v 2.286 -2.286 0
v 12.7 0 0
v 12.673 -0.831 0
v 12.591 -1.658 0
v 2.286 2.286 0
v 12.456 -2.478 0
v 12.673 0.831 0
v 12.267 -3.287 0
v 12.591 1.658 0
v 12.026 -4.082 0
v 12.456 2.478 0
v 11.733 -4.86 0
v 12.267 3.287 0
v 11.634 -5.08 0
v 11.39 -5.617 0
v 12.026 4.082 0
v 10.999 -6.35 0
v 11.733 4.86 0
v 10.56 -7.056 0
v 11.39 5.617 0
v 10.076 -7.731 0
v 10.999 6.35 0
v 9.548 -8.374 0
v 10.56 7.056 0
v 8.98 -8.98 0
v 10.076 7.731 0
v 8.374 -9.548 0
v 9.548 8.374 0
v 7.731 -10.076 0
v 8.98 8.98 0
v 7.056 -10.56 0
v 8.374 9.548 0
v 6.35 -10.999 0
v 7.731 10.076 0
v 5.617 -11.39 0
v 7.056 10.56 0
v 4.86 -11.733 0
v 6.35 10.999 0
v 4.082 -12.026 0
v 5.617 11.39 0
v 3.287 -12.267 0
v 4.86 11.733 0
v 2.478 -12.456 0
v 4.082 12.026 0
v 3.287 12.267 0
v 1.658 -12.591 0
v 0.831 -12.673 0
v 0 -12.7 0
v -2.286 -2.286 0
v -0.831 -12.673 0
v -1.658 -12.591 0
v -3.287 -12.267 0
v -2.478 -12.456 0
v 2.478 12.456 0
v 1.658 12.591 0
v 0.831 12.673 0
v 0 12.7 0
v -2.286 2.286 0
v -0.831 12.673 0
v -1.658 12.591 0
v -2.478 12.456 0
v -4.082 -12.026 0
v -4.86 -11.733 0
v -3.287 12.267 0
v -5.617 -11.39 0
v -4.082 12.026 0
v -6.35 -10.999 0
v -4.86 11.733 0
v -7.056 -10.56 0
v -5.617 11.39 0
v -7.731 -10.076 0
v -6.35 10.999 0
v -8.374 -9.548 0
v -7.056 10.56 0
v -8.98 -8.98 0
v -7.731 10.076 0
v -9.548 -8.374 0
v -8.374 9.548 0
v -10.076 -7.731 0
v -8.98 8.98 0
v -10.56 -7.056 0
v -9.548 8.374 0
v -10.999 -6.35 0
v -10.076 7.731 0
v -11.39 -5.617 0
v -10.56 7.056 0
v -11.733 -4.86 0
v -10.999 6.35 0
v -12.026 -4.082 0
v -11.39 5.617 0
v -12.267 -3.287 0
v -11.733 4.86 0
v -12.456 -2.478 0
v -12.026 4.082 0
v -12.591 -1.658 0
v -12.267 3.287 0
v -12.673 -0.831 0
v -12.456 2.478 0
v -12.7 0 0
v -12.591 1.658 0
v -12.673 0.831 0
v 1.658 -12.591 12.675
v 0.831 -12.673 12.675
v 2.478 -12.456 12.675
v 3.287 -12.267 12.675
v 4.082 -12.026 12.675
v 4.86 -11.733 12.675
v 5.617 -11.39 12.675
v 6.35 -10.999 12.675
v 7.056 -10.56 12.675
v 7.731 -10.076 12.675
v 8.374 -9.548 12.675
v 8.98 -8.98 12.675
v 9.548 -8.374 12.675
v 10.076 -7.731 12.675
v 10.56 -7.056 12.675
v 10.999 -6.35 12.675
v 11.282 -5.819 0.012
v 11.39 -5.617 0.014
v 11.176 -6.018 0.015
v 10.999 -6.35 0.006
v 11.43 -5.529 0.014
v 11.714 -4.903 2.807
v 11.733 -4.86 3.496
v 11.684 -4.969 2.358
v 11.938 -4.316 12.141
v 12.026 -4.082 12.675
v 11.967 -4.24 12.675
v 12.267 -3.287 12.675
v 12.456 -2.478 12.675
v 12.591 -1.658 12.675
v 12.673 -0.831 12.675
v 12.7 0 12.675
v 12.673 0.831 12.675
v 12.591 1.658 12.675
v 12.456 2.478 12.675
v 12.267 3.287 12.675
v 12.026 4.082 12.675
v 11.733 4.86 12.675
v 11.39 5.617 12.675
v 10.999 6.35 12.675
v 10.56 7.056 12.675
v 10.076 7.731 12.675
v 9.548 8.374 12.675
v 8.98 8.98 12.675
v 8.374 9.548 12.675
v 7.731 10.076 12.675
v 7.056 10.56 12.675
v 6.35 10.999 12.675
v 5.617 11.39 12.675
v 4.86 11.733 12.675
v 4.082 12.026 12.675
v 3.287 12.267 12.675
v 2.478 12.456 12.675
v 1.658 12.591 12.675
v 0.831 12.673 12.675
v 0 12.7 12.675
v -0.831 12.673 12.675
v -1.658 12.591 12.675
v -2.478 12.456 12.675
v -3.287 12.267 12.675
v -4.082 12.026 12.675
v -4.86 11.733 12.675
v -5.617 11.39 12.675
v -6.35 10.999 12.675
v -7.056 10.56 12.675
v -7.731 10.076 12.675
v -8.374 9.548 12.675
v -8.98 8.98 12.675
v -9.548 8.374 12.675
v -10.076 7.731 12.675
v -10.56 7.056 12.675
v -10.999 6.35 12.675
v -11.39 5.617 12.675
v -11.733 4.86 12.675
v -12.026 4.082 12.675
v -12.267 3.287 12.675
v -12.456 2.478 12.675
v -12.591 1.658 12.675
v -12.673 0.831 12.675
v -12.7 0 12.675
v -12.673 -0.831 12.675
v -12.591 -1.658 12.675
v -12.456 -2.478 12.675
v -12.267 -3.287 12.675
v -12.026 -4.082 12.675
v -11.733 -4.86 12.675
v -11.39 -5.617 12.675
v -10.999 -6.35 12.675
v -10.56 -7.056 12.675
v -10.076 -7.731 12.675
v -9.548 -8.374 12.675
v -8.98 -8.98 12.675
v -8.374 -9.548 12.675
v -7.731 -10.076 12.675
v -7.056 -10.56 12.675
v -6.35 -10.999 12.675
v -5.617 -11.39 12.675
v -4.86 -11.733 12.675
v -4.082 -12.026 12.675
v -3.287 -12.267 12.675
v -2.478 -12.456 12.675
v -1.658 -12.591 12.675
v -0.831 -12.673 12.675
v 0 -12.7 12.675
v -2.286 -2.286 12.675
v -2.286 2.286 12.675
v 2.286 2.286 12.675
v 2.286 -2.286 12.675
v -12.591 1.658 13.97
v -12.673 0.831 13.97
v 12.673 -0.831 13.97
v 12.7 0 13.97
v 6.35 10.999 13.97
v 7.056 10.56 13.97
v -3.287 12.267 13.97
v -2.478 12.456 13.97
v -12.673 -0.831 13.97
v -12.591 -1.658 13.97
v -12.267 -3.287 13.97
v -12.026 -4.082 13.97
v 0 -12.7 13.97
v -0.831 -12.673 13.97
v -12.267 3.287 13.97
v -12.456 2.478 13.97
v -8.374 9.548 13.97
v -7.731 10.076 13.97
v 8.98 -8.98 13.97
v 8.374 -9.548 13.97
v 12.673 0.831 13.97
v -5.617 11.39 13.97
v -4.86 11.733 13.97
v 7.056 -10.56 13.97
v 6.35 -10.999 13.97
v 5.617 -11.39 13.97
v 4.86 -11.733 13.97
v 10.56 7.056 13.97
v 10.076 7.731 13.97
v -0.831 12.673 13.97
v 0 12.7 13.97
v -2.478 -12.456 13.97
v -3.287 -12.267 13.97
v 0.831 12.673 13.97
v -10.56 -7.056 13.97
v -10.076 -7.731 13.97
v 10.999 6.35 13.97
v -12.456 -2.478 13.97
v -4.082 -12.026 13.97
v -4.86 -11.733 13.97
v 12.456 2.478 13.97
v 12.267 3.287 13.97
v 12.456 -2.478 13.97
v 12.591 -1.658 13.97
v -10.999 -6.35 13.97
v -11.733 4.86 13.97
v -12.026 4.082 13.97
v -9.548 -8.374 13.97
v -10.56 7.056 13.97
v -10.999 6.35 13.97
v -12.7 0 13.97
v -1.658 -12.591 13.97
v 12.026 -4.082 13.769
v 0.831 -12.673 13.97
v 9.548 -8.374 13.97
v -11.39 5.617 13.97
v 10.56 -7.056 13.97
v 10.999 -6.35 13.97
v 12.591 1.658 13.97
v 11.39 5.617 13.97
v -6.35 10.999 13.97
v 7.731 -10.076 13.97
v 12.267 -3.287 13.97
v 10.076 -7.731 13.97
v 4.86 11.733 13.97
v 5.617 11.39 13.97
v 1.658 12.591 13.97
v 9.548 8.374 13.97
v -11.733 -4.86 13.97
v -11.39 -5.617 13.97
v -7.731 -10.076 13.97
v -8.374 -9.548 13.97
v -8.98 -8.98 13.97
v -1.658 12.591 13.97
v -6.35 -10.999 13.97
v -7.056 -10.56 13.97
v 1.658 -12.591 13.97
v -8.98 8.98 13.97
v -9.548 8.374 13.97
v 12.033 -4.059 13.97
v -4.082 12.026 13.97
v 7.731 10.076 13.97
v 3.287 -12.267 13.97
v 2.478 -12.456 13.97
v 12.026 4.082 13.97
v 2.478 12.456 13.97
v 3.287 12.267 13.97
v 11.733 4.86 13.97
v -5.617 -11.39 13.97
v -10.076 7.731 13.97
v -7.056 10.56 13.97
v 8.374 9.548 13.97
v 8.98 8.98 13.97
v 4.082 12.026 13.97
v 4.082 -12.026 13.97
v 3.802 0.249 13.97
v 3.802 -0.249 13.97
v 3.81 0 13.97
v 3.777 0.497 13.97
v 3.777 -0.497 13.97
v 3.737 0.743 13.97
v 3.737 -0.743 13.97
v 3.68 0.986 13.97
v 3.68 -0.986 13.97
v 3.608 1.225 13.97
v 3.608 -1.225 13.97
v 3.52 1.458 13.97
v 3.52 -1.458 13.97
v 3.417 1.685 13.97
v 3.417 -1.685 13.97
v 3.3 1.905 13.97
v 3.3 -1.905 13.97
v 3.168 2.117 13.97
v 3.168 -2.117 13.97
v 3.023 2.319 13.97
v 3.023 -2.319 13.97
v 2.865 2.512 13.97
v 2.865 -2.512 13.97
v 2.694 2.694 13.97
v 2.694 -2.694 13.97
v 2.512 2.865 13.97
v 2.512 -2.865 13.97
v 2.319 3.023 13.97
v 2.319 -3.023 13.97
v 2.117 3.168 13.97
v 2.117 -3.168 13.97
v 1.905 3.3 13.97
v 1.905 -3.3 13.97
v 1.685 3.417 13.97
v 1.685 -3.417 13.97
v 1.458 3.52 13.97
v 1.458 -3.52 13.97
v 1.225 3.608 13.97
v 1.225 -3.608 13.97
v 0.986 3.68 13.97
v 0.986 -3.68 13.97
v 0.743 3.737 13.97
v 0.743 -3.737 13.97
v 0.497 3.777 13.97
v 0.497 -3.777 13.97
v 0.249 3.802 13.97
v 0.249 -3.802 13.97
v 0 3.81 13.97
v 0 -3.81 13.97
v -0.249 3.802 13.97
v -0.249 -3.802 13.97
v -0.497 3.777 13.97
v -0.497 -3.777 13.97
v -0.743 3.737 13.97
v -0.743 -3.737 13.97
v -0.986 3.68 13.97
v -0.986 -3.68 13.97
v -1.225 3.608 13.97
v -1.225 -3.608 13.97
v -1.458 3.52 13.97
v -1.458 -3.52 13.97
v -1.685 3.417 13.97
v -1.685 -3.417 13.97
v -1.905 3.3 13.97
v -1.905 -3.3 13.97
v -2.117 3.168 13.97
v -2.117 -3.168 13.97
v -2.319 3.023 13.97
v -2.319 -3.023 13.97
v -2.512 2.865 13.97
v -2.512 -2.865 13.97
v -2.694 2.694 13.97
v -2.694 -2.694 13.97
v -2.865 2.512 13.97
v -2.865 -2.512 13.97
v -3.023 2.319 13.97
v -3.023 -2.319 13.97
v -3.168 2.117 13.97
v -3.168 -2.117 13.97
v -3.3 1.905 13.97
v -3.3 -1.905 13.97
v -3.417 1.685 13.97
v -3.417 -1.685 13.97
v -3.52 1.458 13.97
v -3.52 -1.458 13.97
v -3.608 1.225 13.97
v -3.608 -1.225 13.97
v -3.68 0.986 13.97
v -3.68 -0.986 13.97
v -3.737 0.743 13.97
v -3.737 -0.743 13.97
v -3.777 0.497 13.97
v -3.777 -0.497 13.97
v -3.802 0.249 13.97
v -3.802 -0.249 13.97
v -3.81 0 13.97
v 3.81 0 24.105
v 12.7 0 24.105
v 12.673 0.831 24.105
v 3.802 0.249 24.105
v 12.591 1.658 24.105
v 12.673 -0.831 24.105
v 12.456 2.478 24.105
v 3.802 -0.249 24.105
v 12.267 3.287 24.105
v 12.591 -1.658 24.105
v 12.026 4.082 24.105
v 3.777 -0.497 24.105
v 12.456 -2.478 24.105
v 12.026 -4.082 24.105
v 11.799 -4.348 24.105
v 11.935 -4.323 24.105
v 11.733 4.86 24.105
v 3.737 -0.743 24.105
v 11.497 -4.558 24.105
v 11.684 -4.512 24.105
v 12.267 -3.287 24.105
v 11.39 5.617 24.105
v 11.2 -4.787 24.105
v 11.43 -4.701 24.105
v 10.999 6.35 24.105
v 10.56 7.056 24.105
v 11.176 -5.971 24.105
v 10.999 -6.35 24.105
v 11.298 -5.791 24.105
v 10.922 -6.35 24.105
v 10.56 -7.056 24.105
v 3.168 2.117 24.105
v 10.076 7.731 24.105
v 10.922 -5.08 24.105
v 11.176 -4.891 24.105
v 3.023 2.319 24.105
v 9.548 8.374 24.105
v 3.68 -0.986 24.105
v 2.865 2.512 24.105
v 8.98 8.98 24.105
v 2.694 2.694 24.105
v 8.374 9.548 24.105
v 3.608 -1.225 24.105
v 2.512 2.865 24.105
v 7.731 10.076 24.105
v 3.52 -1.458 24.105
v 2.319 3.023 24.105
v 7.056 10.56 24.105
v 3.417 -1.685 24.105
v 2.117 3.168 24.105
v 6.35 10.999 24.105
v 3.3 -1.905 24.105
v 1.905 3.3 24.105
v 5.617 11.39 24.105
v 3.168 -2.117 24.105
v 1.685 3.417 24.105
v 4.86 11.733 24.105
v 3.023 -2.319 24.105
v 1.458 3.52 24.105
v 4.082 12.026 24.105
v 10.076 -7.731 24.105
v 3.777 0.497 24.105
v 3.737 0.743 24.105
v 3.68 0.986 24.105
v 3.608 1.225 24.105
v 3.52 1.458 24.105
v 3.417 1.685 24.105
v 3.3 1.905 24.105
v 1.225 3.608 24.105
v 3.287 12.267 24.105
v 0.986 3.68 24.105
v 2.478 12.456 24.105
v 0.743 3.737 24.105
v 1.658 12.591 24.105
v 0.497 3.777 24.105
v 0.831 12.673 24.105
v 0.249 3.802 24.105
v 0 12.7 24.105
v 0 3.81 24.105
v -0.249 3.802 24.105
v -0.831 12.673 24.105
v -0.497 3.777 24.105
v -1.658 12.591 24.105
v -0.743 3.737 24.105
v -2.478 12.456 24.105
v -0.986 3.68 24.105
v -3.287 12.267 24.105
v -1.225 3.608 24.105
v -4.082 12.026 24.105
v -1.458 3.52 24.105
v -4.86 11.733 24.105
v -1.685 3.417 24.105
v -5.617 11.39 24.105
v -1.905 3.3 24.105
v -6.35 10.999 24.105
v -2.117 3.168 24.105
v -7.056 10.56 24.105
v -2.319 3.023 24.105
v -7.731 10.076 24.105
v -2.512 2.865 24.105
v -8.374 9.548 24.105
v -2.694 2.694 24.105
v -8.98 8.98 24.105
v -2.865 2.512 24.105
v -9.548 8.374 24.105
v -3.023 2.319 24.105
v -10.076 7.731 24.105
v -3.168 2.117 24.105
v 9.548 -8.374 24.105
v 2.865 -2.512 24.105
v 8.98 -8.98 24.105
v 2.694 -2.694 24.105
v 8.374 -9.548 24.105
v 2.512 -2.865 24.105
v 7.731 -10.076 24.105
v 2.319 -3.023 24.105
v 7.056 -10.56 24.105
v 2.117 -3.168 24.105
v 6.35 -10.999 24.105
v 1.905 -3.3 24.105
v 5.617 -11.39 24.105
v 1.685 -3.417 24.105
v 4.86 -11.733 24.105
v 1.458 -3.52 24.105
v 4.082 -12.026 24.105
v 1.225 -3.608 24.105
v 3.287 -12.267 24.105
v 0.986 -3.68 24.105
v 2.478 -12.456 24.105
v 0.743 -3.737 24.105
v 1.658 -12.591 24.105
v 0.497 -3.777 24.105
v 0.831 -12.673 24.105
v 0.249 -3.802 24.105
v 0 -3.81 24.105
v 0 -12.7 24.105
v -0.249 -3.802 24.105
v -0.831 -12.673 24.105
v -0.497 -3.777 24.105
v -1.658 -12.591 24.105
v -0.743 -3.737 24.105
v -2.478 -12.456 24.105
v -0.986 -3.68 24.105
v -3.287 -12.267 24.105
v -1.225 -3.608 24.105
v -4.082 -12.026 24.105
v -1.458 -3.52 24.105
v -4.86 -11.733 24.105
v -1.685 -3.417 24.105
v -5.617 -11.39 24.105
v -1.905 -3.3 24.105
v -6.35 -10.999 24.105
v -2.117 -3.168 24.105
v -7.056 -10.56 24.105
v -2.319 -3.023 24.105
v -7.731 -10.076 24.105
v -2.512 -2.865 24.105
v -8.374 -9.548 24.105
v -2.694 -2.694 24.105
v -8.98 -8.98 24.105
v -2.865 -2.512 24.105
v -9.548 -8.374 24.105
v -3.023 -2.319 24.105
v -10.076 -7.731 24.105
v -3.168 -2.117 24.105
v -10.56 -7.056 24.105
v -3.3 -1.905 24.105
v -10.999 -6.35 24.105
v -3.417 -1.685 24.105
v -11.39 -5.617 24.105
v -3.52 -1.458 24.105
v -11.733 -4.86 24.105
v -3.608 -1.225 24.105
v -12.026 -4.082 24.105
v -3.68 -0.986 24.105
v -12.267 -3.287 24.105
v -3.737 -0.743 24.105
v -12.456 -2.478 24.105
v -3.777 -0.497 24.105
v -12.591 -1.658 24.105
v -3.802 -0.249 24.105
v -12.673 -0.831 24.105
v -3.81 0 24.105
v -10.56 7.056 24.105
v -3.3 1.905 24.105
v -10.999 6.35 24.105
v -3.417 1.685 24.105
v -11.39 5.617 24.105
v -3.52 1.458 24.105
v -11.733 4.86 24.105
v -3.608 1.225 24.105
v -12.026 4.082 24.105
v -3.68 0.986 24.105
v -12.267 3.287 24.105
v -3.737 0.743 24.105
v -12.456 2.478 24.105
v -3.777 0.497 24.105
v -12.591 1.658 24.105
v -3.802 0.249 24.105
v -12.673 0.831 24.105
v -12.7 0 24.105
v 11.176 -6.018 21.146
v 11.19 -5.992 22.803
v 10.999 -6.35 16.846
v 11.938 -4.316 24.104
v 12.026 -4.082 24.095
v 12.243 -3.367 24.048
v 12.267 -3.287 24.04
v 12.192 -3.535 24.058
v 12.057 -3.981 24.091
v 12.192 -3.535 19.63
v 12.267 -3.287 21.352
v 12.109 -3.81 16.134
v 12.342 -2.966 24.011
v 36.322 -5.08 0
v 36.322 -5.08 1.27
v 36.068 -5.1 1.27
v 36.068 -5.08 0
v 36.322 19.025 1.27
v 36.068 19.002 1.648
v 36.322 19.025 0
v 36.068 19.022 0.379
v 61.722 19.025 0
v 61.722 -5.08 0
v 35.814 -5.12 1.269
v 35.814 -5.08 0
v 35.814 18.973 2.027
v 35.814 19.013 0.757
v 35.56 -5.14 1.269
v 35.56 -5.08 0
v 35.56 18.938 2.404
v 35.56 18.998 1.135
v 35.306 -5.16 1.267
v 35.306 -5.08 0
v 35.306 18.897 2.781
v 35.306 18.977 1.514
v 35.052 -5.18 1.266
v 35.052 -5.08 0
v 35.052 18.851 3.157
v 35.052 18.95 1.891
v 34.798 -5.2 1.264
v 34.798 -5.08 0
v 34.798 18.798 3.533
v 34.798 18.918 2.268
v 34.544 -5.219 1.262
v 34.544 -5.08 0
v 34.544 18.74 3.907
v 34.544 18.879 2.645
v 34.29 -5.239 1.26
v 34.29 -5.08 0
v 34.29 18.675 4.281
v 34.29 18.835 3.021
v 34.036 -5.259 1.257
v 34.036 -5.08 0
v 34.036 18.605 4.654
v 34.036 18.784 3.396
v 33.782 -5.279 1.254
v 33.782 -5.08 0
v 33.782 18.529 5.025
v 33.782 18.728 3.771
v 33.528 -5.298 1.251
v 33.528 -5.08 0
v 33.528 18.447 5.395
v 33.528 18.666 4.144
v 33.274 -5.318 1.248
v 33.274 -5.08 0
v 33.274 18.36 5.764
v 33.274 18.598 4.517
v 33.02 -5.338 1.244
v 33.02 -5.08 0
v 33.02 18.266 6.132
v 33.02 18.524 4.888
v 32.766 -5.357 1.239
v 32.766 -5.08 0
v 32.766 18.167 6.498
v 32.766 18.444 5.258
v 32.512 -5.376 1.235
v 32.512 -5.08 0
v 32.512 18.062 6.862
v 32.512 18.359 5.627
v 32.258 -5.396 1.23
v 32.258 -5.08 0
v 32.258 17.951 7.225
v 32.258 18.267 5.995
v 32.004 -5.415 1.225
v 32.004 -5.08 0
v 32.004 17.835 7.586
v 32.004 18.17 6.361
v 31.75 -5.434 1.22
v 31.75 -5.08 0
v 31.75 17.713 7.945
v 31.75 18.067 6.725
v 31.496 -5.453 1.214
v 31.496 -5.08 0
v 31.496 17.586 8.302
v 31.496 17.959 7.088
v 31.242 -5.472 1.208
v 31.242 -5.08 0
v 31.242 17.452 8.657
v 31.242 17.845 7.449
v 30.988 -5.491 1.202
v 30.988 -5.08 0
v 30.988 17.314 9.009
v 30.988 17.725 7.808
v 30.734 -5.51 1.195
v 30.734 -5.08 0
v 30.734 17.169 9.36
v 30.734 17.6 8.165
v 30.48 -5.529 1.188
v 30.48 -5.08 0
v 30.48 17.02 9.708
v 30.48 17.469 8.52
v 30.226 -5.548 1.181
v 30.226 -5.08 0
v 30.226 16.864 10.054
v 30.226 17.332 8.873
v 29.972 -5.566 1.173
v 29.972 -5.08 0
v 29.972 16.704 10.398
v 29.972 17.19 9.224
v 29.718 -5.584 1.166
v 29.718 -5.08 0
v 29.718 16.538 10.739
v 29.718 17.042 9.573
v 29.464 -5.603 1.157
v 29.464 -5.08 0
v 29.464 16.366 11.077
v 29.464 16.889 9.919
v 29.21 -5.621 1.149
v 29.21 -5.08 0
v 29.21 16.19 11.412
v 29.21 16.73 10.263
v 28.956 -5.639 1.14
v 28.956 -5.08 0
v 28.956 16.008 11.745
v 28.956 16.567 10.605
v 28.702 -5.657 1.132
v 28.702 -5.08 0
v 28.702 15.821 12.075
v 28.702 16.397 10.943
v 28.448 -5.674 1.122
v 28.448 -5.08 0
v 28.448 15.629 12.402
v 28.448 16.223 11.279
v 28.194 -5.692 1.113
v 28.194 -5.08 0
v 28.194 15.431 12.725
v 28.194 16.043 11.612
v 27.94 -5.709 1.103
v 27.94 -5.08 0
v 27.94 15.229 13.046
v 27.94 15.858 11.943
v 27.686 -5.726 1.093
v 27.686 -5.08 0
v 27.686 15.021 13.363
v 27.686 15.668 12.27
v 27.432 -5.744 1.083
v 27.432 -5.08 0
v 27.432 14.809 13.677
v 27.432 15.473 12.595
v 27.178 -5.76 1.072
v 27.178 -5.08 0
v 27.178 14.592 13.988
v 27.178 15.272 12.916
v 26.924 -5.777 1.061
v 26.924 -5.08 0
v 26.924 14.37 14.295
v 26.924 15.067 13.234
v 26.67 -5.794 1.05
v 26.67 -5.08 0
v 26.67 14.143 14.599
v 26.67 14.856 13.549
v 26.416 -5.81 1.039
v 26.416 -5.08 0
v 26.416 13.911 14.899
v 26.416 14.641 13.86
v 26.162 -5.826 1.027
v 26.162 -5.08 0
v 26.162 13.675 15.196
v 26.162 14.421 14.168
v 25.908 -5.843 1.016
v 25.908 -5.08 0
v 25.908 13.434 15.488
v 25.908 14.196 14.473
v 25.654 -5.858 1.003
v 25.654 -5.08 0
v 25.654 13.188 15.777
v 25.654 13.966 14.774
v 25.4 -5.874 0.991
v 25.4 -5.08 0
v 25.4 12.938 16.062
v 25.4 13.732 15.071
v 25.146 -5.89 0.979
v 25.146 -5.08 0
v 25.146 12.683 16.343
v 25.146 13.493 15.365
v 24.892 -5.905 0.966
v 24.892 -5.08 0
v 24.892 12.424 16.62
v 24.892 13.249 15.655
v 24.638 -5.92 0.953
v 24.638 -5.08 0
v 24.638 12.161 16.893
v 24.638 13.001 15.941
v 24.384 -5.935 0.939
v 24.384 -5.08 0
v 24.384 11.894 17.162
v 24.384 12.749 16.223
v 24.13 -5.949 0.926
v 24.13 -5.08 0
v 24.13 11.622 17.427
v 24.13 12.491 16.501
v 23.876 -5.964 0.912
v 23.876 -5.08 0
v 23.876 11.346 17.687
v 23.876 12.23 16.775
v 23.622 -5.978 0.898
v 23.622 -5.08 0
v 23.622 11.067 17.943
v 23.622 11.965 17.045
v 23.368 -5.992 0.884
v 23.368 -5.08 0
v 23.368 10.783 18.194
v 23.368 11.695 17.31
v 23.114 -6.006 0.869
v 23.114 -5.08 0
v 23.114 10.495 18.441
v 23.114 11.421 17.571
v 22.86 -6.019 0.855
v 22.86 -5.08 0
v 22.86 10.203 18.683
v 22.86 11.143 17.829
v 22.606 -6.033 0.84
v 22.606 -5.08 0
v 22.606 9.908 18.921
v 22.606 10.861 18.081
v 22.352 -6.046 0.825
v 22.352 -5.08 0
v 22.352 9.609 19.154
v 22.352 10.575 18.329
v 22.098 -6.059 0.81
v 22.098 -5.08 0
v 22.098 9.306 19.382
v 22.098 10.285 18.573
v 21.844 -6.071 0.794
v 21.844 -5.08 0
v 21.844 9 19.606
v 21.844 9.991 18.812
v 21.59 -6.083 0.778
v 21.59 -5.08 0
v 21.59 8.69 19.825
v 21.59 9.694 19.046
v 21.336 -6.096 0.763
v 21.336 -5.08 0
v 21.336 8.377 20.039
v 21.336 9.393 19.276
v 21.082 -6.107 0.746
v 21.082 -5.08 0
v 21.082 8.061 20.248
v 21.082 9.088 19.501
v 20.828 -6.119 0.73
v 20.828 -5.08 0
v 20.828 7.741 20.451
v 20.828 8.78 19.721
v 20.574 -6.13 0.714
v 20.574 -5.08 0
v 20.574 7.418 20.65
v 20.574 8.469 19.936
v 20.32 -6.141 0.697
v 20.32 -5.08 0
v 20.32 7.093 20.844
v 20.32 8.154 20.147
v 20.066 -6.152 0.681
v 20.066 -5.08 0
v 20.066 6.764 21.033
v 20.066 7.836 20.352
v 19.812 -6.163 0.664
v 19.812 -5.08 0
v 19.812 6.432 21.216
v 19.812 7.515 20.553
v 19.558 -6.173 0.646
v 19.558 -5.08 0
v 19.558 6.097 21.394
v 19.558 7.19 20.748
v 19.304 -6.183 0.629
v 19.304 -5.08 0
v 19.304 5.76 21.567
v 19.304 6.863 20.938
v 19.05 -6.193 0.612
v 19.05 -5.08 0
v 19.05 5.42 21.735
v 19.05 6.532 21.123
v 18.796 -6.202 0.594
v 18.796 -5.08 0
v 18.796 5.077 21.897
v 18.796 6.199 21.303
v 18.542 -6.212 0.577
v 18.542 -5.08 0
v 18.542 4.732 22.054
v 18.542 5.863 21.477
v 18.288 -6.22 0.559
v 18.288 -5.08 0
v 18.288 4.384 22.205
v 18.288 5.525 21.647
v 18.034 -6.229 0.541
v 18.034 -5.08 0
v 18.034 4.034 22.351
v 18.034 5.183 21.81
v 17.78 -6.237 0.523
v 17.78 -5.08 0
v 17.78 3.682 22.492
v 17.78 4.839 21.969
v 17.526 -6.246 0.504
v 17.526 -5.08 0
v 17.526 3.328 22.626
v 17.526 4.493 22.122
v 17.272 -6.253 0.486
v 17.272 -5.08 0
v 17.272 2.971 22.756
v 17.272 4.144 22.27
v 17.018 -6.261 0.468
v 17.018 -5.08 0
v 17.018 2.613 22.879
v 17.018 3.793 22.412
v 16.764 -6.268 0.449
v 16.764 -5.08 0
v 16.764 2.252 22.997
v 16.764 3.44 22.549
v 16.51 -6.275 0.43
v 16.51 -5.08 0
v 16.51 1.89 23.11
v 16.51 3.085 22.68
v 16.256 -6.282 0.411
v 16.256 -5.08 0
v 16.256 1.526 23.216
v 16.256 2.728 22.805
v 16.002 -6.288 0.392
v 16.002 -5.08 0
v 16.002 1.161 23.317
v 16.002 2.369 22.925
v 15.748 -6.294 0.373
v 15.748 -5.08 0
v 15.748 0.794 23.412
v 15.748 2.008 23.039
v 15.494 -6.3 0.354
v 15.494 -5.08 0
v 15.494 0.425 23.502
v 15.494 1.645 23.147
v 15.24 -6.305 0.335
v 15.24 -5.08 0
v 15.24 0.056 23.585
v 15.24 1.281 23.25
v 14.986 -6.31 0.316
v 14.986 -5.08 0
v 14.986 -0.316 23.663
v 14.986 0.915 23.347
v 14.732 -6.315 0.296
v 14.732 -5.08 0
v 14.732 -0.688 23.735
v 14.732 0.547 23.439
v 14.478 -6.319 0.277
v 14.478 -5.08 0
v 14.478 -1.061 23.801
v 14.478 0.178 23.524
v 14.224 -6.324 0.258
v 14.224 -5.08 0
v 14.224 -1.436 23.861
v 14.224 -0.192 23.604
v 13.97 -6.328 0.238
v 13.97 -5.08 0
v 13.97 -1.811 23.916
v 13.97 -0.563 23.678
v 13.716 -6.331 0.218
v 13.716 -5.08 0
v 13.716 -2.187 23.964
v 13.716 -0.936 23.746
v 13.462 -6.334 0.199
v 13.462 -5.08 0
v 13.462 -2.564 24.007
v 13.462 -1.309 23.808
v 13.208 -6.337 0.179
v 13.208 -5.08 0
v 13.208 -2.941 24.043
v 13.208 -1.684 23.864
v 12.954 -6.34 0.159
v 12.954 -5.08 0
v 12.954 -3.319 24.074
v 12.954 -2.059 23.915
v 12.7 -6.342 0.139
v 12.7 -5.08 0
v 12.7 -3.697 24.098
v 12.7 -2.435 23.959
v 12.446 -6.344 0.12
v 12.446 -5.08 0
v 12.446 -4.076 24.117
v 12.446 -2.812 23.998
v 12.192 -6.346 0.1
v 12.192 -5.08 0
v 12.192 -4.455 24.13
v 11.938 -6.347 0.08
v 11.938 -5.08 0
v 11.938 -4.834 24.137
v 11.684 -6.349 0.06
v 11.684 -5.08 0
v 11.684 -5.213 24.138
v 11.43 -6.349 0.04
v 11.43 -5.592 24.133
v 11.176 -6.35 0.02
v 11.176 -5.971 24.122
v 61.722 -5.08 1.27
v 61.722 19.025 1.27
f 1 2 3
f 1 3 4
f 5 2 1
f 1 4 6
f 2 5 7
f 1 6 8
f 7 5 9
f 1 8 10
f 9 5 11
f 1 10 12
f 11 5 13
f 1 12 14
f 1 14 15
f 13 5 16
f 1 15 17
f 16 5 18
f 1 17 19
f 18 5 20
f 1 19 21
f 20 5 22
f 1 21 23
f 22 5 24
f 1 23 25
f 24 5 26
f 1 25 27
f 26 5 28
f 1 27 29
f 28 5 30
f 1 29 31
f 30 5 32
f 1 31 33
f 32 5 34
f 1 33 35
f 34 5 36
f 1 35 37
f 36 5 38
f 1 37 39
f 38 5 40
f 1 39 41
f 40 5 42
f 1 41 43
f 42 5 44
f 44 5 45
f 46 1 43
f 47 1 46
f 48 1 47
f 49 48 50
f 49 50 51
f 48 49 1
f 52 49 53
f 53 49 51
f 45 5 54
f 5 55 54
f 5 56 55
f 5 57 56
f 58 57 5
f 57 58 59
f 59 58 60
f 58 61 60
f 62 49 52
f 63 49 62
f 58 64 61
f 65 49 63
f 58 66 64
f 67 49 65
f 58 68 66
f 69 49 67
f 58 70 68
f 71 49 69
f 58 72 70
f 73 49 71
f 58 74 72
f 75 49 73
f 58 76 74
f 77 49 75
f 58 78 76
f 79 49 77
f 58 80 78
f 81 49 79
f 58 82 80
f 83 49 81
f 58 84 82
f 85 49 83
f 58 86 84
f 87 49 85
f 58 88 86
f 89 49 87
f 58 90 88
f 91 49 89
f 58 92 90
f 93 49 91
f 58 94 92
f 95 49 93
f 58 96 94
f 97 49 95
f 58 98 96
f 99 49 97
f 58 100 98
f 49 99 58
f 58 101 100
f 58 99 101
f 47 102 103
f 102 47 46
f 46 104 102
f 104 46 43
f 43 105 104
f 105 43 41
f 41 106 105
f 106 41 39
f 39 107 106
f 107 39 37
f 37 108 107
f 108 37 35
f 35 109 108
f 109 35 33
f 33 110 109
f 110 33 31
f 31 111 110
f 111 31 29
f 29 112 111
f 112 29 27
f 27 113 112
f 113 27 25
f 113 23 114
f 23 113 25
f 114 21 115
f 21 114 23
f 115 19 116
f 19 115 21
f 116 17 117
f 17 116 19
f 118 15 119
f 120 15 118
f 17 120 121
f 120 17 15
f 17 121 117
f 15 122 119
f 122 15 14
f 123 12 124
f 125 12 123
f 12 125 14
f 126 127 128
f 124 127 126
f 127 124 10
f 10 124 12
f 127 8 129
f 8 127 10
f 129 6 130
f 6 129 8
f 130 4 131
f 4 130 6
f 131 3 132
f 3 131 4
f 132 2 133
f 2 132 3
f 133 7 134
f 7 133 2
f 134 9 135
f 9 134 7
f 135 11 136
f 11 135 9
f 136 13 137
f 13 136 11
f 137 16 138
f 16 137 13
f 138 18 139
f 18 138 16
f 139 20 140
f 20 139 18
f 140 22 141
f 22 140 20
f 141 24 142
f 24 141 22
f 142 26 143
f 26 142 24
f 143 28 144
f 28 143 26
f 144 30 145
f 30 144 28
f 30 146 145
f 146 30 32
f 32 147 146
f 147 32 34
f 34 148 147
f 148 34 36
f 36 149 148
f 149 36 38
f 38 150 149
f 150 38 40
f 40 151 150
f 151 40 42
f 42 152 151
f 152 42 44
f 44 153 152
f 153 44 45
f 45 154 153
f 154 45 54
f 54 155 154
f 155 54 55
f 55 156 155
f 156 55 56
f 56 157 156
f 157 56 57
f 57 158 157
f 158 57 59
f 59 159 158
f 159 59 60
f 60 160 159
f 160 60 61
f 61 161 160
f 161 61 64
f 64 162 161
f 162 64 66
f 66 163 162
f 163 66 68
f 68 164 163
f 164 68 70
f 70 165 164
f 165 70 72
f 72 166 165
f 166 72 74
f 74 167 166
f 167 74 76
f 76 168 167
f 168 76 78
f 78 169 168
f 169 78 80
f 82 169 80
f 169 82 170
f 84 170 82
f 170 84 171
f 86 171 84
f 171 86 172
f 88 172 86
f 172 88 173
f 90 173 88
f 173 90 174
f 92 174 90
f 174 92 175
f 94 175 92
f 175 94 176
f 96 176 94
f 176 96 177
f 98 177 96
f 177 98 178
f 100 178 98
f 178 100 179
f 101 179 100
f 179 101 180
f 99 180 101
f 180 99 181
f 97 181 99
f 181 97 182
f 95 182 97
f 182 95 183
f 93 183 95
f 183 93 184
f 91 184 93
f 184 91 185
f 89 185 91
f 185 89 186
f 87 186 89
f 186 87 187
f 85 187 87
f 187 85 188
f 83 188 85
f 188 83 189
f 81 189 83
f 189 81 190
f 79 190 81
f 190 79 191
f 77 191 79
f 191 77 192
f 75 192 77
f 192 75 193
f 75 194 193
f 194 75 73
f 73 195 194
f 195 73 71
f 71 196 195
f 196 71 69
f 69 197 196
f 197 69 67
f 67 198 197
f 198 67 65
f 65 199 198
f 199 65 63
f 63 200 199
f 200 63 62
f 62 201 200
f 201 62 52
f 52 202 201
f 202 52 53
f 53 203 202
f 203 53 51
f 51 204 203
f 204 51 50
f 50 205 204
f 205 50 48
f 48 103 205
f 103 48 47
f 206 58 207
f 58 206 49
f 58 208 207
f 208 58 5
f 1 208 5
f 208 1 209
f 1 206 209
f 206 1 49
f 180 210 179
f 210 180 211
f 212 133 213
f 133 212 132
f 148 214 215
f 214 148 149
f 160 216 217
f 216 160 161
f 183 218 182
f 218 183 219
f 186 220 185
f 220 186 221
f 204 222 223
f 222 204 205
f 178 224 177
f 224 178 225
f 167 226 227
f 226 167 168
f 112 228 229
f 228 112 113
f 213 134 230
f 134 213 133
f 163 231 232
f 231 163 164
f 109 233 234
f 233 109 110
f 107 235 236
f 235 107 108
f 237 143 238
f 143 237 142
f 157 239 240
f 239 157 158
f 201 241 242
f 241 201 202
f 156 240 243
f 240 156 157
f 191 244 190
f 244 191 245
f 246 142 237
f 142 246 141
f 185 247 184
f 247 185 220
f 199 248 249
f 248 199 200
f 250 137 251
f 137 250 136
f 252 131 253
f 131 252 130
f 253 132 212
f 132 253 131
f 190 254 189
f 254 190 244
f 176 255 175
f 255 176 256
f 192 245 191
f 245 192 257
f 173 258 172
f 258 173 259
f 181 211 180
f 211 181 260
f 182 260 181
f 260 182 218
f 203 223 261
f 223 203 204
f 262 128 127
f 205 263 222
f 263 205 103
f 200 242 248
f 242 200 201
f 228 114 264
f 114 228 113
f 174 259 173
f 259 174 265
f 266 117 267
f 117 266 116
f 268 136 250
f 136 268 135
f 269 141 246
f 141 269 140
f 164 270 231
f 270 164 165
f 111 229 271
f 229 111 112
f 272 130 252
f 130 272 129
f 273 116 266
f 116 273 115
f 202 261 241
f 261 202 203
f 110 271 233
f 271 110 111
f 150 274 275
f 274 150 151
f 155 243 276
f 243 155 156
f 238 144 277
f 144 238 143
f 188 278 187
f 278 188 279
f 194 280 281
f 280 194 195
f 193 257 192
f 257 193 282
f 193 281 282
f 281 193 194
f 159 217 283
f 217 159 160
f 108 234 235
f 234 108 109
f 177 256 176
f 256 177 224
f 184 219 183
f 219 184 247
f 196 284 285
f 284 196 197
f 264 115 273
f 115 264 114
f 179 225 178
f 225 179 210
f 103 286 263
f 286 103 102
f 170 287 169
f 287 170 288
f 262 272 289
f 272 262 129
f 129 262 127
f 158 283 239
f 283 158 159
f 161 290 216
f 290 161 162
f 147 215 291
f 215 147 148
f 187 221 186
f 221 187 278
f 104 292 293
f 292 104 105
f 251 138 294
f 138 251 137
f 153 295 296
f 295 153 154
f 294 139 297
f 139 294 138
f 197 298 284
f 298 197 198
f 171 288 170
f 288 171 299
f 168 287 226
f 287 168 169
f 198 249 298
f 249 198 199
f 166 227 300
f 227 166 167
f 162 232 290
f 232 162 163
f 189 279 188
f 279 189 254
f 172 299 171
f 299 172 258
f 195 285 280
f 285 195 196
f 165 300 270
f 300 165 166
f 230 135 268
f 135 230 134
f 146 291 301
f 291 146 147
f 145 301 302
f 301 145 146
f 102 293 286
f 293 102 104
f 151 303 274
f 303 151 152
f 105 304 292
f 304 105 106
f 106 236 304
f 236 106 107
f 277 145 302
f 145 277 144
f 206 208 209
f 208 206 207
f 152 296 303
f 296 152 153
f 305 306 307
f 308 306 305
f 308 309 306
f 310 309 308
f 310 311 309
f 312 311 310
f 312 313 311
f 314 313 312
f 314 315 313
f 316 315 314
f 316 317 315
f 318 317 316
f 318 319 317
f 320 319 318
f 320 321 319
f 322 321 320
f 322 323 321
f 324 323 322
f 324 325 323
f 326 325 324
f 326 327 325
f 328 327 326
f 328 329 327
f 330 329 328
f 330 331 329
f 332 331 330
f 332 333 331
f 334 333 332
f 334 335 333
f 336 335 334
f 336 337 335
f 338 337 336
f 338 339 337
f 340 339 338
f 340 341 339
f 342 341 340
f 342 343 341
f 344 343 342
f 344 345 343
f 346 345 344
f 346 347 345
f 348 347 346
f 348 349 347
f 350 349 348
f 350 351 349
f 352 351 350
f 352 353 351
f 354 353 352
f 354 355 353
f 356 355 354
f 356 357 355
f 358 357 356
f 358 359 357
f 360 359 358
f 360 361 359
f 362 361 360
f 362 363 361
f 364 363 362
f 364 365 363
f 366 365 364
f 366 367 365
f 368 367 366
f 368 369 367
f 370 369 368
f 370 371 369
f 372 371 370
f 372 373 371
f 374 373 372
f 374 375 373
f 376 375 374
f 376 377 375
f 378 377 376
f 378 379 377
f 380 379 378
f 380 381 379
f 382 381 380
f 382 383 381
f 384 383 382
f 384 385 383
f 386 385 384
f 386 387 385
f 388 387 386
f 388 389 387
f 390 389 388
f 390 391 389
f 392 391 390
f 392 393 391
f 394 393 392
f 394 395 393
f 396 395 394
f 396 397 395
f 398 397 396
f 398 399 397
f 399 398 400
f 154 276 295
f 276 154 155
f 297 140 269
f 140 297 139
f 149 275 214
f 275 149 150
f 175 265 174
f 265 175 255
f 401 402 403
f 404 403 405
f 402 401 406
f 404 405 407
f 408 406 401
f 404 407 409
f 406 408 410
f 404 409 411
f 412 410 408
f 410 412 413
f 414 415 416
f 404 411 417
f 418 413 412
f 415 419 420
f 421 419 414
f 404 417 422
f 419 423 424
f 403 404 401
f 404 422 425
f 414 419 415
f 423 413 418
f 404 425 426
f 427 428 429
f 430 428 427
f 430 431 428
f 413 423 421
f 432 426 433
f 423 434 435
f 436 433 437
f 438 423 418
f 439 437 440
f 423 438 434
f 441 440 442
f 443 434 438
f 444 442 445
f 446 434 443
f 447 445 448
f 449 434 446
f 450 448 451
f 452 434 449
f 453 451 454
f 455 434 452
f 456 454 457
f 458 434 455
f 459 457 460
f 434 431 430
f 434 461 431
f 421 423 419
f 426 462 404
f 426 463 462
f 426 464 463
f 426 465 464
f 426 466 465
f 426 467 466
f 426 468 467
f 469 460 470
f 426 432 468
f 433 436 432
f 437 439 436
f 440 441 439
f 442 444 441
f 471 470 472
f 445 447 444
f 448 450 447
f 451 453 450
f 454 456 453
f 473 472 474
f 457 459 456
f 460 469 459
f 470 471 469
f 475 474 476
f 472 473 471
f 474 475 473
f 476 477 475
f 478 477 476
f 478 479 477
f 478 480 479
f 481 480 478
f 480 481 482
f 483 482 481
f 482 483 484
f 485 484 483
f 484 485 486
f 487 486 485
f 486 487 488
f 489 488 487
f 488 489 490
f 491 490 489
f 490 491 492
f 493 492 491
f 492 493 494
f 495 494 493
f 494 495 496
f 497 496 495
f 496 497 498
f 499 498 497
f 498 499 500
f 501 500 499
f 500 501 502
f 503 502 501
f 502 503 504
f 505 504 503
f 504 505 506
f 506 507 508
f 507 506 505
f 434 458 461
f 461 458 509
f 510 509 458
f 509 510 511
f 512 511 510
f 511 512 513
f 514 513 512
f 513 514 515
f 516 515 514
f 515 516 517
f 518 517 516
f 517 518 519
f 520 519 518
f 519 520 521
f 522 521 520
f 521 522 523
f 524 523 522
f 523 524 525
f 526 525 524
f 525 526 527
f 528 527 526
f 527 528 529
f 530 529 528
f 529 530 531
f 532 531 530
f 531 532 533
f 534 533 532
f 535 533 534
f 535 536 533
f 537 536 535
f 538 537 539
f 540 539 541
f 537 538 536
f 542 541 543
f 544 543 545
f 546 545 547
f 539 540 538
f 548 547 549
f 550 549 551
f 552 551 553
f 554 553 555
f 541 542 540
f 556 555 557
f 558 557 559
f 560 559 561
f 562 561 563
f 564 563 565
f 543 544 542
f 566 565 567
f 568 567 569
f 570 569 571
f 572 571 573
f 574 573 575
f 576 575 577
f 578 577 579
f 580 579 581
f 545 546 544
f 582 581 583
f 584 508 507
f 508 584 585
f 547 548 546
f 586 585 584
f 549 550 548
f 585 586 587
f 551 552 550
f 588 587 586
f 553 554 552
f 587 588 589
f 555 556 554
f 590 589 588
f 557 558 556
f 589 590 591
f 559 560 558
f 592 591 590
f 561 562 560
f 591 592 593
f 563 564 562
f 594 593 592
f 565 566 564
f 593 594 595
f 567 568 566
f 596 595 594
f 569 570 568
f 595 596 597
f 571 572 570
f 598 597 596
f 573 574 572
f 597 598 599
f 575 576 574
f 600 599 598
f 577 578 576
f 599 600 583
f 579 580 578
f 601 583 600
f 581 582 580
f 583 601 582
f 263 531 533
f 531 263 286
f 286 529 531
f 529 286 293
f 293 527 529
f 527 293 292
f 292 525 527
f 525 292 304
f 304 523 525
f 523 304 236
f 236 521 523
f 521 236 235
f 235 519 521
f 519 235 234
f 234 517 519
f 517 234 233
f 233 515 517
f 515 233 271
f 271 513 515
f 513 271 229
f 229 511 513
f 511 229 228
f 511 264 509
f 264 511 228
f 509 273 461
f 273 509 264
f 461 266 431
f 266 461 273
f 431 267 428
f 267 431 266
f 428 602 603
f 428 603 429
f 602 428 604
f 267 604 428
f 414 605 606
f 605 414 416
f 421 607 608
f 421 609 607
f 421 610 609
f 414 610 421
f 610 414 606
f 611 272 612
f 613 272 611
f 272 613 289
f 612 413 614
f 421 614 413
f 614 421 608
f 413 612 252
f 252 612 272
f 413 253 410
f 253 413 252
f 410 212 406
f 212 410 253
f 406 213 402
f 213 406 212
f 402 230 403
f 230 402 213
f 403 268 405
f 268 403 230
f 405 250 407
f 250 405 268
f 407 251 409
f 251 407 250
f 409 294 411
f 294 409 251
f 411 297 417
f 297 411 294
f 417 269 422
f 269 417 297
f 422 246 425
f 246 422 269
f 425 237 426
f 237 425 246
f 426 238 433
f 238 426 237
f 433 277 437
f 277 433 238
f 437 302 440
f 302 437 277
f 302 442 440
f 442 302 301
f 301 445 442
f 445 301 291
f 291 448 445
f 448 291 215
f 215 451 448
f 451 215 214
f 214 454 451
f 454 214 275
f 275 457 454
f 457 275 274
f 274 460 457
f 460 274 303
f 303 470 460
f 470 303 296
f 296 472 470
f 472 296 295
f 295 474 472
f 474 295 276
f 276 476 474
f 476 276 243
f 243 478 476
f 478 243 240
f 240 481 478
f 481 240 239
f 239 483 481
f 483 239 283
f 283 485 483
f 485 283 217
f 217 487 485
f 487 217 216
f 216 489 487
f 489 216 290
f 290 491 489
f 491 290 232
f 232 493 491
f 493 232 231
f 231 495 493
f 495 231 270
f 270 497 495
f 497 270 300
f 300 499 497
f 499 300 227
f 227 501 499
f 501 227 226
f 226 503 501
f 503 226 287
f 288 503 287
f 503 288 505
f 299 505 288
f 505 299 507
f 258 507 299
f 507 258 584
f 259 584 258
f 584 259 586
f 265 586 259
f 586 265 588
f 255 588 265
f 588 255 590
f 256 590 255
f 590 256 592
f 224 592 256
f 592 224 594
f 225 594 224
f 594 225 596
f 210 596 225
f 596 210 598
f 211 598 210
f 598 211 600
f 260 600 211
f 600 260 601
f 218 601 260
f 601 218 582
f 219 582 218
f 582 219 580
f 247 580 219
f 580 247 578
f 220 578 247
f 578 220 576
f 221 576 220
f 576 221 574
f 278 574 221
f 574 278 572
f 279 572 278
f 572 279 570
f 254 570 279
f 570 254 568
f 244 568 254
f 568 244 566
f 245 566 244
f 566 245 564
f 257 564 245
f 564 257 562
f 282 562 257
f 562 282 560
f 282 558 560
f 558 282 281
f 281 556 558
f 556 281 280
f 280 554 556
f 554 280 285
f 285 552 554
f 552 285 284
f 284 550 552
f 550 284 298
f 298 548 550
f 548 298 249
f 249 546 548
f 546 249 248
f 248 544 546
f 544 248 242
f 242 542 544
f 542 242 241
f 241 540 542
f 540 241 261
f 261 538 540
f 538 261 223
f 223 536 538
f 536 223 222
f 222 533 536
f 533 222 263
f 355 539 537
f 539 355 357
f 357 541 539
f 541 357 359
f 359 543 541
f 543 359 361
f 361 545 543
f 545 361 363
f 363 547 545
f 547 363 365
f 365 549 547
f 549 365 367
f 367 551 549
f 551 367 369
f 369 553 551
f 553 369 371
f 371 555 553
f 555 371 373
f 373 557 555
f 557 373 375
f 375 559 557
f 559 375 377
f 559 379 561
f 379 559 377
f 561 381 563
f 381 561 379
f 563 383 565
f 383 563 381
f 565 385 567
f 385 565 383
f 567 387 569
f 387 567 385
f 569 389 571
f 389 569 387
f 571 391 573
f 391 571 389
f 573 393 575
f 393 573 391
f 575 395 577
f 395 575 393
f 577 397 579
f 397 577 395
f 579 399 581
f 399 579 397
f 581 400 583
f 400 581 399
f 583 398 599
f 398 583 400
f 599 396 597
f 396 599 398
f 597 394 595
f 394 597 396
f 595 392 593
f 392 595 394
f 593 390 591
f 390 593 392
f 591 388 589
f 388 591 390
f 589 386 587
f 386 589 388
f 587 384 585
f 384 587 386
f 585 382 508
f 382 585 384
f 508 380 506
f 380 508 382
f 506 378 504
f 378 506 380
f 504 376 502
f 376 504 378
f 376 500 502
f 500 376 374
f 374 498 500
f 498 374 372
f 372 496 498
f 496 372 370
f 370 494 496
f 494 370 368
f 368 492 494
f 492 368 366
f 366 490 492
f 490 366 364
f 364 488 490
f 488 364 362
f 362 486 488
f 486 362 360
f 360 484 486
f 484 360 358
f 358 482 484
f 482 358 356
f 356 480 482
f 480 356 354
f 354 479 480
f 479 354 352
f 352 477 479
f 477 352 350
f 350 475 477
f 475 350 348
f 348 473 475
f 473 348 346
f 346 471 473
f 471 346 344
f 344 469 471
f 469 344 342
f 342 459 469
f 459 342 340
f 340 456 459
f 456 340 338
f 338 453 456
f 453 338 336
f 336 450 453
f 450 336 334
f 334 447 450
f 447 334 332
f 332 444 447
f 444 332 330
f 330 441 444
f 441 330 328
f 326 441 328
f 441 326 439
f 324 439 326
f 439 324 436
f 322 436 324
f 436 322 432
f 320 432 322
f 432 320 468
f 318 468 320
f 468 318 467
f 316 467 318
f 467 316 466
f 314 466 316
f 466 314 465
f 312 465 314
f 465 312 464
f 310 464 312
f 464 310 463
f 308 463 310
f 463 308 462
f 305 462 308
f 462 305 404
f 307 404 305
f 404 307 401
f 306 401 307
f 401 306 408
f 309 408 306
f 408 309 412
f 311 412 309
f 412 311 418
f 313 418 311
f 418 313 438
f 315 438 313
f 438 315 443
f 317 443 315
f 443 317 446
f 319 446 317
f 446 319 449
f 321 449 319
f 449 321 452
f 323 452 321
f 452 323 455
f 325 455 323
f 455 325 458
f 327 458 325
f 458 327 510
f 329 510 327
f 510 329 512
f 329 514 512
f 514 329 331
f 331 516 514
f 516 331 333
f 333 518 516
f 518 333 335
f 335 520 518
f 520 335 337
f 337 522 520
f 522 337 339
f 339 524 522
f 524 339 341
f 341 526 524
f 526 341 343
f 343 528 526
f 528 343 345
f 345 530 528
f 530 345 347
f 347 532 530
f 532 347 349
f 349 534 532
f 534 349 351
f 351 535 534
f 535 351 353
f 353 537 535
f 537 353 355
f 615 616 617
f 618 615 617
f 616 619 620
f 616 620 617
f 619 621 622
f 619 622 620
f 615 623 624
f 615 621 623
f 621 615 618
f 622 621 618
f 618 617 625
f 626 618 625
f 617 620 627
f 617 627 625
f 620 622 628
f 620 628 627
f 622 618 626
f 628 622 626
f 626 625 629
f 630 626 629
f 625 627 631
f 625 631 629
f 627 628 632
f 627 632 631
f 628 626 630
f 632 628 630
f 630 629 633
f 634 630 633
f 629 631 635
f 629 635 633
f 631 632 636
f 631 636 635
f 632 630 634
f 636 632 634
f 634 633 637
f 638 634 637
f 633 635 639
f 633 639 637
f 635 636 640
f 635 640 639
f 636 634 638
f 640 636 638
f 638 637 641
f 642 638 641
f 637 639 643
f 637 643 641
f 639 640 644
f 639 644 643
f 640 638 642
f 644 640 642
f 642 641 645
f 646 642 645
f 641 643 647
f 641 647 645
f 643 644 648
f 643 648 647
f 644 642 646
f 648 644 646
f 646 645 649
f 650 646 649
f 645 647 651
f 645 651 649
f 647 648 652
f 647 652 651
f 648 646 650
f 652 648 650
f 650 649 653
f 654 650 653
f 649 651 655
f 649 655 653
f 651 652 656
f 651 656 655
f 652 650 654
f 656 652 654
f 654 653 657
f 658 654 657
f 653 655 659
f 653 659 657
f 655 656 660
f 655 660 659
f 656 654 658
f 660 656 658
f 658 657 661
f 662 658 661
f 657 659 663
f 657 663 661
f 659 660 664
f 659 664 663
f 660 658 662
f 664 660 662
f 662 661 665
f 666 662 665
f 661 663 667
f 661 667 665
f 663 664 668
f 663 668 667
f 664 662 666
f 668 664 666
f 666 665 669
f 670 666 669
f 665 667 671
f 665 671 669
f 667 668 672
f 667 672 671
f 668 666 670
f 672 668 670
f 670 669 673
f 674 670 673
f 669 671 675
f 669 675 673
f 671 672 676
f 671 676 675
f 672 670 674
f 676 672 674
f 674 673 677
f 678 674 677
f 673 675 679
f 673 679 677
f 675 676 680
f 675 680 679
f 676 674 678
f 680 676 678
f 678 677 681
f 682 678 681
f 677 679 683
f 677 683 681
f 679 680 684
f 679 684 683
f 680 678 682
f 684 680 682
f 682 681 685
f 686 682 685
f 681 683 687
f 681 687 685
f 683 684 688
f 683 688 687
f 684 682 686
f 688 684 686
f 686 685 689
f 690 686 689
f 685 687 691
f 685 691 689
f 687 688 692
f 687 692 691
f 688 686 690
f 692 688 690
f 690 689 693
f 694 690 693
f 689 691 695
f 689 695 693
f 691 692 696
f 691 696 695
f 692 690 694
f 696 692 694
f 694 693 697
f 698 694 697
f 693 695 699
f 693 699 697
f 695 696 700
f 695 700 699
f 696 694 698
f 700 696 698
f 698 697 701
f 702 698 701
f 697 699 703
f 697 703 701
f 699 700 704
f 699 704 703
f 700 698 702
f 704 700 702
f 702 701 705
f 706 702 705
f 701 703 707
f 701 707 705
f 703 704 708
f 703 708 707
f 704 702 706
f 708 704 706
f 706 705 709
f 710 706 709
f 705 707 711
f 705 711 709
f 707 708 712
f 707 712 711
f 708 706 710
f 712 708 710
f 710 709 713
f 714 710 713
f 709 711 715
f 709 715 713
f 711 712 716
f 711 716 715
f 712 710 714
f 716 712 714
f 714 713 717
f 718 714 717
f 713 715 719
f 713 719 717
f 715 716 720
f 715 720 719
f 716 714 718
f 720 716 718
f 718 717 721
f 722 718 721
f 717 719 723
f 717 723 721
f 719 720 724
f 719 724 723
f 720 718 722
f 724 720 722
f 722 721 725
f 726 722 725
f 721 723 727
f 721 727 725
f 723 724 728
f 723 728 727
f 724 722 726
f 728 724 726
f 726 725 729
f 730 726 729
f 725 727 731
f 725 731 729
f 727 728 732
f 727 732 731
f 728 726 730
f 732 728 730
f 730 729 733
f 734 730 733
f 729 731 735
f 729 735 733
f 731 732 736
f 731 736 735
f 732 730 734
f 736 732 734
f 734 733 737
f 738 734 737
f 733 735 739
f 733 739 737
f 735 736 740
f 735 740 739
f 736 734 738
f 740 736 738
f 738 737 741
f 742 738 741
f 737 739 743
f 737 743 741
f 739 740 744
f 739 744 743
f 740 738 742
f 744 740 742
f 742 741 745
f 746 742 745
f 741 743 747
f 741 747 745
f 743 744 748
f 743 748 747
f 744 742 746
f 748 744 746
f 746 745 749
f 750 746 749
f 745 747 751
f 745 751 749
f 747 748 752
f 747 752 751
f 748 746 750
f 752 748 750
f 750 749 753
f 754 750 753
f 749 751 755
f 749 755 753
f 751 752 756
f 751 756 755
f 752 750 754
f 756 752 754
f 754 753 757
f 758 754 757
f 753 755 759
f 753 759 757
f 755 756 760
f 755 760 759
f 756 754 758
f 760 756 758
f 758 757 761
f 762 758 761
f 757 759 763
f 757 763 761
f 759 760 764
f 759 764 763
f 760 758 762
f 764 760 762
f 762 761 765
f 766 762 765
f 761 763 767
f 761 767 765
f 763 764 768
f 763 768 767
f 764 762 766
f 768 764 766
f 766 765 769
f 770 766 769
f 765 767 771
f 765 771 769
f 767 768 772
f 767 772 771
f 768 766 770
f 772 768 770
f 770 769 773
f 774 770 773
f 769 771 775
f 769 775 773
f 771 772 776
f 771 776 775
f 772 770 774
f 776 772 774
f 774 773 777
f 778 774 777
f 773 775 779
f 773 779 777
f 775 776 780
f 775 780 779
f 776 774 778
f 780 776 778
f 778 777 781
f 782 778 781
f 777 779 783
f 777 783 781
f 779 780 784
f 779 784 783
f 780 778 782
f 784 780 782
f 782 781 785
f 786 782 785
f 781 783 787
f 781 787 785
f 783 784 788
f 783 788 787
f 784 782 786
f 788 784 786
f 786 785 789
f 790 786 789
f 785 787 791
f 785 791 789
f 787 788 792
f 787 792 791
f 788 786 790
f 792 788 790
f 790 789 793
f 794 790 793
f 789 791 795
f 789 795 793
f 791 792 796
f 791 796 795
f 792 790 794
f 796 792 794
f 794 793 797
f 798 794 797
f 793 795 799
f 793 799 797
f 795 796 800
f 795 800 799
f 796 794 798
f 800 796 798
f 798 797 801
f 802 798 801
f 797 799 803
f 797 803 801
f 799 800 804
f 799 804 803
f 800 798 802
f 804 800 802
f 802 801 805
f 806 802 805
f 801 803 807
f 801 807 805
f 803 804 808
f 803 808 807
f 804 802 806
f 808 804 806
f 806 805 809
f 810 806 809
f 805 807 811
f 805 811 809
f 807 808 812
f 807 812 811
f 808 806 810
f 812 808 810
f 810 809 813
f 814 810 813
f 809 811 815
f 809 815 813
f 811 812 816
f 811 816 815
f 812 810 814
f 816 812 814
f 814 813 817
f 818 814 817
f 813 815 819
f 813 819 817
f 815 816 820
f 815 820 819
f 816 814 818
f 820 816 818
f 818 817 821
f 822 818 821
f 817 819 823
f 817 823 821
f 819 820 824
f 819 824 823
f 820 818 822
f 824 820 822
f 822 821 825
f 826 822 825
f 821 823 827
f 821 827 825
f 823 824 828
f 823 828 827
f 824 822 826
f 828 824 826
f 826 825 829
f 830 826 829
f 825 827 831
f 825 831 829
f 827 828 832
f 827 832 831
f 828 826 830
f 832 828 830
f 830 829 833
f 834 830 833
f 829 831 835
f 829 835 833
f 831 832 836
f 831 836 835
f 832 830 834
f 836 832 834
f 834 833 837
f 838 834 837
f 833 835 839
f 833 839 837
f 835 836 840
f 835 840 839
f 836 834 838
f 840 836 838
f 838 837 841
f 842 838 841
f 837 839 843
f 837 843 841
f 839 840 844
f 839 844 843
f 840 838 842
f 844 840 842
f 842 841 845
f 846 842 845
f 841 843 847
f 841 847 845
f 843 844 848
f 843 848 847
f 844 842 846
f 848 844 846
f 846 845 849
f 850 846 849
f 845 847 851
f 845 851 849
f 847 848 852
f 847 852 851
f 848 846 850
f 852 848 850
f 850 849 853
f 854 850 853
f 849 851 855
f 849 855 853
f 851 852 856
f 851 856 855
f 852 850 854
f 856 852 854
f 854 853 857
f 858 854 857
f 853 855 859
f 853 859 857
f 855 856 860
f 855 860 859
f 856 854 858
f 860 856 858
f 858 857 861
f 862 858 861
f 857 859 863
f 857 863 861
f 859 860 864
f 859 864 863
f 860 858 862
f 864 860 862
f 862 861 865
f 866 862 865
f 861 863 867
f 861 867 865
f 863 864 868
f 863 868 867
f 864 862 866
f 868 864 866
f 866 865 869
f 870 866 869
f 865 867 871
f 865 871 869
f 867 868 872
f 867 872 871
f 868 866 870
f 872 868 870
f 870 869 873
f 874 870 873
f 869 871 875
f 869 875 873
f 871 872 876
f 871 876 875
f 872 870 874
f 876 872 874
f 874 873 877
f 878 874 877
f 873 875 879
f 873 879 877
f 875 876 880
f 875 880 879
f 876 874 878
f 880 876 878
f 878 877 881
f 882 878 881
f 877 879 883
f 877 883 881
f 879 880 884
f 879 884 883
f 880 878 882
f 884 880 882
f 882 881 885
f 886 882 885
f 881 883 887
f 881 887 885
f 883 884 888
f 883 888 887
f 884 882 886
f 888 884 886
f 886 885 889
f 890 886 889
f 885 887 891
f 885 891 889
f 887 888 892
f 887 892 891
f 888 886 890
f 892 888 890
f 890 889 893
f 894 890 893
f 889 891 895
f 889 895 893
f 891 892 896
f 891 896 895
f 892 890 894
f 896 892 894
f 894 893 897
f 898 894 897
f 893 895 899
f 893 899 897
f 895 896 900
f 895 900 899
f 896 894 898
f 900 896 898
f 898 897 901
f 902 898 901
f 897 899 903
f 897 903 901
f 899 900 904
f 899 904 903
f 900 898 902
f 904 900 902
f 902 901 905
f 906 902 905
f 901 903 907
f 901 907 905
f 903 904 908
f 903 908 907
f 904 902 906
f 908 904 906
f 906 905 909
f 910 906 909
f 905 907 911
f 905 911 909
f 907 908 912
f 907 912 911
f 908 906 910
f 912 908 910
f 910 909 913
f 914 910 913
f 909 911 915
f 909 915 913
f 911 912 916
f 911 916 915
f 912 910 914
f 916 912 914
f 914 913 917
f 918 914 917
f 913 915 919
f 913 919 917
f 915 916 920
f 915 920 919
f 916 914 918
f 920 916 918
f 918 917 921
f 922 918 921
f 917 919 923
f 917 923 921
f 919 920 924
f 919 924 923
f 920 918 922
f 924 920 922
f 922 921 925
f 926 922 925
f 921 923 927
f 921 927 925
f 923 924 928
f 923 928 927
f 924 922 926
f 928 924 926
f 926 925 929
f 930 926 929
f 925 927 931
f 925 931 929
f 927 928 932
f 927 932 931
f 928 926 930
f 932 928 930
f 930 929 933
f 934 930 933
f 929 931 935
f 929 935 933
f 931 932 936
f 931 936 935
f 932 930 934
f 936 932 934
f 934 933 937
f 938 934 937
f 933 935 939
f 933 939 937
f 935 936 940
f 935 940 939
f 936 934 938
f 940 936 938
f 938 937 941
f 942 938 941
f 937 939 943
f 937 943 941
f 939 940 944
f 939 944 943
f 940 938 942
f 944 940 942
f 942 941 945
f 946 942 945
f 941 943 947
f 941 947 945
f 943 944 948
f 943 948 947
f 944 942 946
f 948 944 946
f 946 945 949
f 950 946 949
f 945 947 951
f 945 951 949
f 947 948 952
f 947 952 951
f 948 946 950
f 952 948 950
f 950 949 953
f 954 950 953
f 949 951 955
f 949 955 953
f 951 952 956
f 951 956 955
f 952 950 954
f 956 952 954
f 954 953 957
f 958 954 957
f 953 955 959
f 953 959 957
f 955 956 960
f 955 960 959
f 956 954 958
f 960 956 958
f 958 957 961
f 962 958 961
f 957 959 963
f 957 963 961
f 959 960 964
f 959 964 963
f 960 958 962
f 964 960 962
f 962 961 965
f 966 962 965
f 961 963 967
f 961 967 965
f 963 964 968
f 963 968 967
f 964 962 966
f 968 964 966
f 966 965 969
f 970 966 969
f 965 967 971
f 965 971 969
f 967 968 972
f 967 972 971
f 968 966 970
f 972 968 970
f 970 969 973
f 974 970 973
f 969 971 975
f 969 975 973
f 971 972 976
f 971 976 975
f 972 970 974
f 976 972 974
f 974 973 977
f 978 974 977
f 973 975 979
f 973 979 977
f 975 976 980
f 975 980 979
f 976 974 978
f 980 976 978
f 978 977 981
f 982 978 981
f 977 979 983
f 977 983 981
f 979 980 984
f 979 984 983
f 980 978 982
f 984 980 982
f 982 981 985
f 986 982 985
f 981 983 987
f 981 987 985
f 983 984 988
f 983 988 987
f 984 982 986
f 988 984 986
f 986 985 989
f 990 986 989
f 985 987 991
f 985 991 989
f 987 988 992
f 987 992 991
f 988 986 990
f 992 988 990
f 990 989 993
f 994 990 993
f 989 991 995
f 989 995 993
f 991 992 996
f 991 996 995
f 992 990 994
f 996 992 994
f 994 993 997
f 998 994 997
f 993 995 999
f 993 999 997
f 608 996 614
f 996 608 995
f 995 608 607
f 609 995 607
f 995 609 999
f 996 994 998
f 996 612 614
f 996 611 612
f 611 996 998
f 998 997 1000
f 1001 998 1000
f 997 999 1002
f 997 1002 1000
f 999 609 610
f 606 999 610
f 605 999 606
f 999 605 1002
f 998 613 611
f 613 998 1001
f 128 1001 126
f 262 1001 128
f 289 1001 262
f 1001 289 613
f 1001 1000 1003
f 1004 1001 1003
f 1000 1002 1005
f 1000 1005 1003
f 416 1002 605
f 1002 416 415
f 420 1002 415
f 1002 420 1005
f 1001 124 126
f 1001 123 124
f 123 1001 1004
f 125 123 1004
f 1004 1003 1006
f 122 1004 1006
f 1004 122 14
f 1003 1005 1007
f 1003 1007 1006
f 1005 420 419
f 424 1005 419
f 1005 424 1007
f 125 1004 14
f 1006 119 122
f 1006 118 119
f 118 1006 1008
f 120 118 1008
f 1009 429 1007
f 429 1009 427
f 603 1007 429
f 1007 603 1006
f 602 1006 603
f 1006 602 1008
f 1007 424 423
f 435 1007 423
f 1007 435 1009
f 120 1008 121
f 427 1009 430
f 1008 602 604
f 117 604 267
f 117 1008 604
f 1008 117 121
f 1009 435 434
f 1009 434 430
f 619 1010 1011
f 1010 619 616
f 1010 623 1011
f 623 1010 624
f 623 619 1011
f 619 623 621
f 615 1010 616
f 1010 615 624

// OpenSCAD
ViewScale = [0.0254, 0.0254, 0.0254];

module roll()
{
    linear_extrude(500)
    difference() {
        circle(500, $fn=96);
        square([180, 180], center=true);
    }
    translate([0, 0, 499])
    linear_extrude(51)
    circle(500, $fn=96);

    translate([0, 0, 549])
    linear_extrude(400)
    difference() {
        circle(500, $fn=96);
        circle(150, $fn=96);
    }
}

module twist()
{
    linear_extrude(height=1000, slices=100, twist=90)
    square([50, 949]);
}

module trail()
{
    translate([1430, -200, 50])
    rotate([0, 90, 0])
    linear_extrude(1000)
    square([50, 949]);
}

module toiletroll()
{
    color("White")
    {
        roll();
        translate([1430, -200, 0])
        rotate([0, -90, 0])
        twist();
        trail();
    }
}


scale(ViewScale)
{
    toiletroll();
}
